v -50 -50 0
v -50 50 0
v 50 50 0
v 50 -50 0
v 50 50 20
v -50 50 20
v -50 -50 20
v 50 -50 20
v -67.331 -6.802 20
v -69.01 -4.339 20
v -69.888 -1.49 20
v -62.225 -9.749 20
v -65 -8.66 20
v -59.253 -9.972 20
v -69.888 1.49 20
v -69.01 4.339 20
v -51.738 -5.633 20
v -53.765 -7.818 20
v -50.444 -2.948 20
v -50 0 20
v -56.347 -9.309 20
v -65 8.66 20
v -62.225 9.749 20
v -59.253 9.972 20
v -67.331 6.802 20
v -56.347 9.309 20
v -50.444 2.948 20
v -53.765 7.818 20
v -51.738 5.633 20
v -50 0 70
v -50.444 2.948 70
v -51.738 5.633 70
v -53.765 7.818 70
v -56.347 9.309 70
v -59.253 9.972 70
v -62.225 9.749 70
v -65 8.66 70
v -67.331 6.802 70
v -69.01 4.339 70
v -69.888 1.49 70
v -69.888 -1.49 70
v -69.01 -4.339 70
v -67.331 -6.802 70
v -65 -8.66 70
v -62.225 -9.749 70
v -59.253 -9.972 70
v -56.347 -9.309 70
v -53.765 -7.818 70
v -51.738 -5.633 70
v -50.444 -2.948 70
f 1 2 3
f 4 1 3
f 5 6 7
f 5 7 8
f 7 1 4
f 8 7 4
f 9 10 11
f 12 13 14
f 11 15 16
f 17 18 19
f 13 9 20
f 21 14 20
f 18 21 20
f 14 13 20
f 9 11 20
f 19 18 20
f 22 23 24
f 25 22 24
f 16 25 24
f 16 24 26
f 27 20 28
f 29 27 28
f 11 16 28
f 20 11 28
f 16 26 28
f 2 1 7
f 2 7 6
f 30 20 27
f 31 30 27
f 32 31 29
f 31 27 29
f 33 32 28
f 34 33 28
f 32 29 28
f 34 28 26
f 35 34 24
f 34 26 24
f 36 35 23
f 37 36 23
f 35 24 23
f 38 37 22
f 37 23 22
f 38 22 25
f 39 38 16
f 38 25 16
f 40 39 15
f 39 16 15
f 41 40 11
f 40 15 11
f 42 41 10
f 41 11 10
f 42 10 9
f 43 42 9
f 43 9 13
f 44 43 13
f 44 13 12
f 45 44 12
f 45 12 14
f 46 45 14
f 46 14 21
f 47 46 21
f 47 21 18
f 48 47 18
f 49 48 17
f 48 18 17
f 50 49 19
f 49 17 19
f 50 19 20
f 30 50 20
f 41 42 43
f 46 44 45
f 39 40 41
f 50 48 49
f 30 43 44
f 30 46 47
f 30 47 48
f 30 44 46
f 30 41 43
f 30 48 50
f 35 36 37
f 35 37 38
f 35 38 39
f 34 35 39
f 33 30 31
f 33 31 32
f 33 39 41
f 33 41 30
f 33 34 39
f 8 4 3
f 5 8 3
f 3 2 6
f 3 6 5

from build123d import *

# Parameters (mm, degrees)
SKETCH_1_W      = 100
SKETCH_1_H      = 100
EXTRUDE_1_DEPTH = 20
SKETCH_2_R      = 10
EXTRUDE_2_DEPTH = 50


with BuildPart() as part:
    # 草图1 → 凸台-拉伸1 (new body)
    with BuildSketch(Plane.XY):
        Rectangle(SKETCH_1_W, SKETCH_1_H)
    extrude(amount=EXTRUDE_1_DEPTH)


with BuildPart() as body_2:
    # 草图2 → 凸台-拉伸2 (new body)
    with BuildSketch(Plane.XY.offset(20)):
        with Locations((-60, 0)):
            Circle(SKETCH_2_R)
    extrude(amount=EXTRUDE_2_DEPTH)


solid = Compound([part.part, body_2.part])
